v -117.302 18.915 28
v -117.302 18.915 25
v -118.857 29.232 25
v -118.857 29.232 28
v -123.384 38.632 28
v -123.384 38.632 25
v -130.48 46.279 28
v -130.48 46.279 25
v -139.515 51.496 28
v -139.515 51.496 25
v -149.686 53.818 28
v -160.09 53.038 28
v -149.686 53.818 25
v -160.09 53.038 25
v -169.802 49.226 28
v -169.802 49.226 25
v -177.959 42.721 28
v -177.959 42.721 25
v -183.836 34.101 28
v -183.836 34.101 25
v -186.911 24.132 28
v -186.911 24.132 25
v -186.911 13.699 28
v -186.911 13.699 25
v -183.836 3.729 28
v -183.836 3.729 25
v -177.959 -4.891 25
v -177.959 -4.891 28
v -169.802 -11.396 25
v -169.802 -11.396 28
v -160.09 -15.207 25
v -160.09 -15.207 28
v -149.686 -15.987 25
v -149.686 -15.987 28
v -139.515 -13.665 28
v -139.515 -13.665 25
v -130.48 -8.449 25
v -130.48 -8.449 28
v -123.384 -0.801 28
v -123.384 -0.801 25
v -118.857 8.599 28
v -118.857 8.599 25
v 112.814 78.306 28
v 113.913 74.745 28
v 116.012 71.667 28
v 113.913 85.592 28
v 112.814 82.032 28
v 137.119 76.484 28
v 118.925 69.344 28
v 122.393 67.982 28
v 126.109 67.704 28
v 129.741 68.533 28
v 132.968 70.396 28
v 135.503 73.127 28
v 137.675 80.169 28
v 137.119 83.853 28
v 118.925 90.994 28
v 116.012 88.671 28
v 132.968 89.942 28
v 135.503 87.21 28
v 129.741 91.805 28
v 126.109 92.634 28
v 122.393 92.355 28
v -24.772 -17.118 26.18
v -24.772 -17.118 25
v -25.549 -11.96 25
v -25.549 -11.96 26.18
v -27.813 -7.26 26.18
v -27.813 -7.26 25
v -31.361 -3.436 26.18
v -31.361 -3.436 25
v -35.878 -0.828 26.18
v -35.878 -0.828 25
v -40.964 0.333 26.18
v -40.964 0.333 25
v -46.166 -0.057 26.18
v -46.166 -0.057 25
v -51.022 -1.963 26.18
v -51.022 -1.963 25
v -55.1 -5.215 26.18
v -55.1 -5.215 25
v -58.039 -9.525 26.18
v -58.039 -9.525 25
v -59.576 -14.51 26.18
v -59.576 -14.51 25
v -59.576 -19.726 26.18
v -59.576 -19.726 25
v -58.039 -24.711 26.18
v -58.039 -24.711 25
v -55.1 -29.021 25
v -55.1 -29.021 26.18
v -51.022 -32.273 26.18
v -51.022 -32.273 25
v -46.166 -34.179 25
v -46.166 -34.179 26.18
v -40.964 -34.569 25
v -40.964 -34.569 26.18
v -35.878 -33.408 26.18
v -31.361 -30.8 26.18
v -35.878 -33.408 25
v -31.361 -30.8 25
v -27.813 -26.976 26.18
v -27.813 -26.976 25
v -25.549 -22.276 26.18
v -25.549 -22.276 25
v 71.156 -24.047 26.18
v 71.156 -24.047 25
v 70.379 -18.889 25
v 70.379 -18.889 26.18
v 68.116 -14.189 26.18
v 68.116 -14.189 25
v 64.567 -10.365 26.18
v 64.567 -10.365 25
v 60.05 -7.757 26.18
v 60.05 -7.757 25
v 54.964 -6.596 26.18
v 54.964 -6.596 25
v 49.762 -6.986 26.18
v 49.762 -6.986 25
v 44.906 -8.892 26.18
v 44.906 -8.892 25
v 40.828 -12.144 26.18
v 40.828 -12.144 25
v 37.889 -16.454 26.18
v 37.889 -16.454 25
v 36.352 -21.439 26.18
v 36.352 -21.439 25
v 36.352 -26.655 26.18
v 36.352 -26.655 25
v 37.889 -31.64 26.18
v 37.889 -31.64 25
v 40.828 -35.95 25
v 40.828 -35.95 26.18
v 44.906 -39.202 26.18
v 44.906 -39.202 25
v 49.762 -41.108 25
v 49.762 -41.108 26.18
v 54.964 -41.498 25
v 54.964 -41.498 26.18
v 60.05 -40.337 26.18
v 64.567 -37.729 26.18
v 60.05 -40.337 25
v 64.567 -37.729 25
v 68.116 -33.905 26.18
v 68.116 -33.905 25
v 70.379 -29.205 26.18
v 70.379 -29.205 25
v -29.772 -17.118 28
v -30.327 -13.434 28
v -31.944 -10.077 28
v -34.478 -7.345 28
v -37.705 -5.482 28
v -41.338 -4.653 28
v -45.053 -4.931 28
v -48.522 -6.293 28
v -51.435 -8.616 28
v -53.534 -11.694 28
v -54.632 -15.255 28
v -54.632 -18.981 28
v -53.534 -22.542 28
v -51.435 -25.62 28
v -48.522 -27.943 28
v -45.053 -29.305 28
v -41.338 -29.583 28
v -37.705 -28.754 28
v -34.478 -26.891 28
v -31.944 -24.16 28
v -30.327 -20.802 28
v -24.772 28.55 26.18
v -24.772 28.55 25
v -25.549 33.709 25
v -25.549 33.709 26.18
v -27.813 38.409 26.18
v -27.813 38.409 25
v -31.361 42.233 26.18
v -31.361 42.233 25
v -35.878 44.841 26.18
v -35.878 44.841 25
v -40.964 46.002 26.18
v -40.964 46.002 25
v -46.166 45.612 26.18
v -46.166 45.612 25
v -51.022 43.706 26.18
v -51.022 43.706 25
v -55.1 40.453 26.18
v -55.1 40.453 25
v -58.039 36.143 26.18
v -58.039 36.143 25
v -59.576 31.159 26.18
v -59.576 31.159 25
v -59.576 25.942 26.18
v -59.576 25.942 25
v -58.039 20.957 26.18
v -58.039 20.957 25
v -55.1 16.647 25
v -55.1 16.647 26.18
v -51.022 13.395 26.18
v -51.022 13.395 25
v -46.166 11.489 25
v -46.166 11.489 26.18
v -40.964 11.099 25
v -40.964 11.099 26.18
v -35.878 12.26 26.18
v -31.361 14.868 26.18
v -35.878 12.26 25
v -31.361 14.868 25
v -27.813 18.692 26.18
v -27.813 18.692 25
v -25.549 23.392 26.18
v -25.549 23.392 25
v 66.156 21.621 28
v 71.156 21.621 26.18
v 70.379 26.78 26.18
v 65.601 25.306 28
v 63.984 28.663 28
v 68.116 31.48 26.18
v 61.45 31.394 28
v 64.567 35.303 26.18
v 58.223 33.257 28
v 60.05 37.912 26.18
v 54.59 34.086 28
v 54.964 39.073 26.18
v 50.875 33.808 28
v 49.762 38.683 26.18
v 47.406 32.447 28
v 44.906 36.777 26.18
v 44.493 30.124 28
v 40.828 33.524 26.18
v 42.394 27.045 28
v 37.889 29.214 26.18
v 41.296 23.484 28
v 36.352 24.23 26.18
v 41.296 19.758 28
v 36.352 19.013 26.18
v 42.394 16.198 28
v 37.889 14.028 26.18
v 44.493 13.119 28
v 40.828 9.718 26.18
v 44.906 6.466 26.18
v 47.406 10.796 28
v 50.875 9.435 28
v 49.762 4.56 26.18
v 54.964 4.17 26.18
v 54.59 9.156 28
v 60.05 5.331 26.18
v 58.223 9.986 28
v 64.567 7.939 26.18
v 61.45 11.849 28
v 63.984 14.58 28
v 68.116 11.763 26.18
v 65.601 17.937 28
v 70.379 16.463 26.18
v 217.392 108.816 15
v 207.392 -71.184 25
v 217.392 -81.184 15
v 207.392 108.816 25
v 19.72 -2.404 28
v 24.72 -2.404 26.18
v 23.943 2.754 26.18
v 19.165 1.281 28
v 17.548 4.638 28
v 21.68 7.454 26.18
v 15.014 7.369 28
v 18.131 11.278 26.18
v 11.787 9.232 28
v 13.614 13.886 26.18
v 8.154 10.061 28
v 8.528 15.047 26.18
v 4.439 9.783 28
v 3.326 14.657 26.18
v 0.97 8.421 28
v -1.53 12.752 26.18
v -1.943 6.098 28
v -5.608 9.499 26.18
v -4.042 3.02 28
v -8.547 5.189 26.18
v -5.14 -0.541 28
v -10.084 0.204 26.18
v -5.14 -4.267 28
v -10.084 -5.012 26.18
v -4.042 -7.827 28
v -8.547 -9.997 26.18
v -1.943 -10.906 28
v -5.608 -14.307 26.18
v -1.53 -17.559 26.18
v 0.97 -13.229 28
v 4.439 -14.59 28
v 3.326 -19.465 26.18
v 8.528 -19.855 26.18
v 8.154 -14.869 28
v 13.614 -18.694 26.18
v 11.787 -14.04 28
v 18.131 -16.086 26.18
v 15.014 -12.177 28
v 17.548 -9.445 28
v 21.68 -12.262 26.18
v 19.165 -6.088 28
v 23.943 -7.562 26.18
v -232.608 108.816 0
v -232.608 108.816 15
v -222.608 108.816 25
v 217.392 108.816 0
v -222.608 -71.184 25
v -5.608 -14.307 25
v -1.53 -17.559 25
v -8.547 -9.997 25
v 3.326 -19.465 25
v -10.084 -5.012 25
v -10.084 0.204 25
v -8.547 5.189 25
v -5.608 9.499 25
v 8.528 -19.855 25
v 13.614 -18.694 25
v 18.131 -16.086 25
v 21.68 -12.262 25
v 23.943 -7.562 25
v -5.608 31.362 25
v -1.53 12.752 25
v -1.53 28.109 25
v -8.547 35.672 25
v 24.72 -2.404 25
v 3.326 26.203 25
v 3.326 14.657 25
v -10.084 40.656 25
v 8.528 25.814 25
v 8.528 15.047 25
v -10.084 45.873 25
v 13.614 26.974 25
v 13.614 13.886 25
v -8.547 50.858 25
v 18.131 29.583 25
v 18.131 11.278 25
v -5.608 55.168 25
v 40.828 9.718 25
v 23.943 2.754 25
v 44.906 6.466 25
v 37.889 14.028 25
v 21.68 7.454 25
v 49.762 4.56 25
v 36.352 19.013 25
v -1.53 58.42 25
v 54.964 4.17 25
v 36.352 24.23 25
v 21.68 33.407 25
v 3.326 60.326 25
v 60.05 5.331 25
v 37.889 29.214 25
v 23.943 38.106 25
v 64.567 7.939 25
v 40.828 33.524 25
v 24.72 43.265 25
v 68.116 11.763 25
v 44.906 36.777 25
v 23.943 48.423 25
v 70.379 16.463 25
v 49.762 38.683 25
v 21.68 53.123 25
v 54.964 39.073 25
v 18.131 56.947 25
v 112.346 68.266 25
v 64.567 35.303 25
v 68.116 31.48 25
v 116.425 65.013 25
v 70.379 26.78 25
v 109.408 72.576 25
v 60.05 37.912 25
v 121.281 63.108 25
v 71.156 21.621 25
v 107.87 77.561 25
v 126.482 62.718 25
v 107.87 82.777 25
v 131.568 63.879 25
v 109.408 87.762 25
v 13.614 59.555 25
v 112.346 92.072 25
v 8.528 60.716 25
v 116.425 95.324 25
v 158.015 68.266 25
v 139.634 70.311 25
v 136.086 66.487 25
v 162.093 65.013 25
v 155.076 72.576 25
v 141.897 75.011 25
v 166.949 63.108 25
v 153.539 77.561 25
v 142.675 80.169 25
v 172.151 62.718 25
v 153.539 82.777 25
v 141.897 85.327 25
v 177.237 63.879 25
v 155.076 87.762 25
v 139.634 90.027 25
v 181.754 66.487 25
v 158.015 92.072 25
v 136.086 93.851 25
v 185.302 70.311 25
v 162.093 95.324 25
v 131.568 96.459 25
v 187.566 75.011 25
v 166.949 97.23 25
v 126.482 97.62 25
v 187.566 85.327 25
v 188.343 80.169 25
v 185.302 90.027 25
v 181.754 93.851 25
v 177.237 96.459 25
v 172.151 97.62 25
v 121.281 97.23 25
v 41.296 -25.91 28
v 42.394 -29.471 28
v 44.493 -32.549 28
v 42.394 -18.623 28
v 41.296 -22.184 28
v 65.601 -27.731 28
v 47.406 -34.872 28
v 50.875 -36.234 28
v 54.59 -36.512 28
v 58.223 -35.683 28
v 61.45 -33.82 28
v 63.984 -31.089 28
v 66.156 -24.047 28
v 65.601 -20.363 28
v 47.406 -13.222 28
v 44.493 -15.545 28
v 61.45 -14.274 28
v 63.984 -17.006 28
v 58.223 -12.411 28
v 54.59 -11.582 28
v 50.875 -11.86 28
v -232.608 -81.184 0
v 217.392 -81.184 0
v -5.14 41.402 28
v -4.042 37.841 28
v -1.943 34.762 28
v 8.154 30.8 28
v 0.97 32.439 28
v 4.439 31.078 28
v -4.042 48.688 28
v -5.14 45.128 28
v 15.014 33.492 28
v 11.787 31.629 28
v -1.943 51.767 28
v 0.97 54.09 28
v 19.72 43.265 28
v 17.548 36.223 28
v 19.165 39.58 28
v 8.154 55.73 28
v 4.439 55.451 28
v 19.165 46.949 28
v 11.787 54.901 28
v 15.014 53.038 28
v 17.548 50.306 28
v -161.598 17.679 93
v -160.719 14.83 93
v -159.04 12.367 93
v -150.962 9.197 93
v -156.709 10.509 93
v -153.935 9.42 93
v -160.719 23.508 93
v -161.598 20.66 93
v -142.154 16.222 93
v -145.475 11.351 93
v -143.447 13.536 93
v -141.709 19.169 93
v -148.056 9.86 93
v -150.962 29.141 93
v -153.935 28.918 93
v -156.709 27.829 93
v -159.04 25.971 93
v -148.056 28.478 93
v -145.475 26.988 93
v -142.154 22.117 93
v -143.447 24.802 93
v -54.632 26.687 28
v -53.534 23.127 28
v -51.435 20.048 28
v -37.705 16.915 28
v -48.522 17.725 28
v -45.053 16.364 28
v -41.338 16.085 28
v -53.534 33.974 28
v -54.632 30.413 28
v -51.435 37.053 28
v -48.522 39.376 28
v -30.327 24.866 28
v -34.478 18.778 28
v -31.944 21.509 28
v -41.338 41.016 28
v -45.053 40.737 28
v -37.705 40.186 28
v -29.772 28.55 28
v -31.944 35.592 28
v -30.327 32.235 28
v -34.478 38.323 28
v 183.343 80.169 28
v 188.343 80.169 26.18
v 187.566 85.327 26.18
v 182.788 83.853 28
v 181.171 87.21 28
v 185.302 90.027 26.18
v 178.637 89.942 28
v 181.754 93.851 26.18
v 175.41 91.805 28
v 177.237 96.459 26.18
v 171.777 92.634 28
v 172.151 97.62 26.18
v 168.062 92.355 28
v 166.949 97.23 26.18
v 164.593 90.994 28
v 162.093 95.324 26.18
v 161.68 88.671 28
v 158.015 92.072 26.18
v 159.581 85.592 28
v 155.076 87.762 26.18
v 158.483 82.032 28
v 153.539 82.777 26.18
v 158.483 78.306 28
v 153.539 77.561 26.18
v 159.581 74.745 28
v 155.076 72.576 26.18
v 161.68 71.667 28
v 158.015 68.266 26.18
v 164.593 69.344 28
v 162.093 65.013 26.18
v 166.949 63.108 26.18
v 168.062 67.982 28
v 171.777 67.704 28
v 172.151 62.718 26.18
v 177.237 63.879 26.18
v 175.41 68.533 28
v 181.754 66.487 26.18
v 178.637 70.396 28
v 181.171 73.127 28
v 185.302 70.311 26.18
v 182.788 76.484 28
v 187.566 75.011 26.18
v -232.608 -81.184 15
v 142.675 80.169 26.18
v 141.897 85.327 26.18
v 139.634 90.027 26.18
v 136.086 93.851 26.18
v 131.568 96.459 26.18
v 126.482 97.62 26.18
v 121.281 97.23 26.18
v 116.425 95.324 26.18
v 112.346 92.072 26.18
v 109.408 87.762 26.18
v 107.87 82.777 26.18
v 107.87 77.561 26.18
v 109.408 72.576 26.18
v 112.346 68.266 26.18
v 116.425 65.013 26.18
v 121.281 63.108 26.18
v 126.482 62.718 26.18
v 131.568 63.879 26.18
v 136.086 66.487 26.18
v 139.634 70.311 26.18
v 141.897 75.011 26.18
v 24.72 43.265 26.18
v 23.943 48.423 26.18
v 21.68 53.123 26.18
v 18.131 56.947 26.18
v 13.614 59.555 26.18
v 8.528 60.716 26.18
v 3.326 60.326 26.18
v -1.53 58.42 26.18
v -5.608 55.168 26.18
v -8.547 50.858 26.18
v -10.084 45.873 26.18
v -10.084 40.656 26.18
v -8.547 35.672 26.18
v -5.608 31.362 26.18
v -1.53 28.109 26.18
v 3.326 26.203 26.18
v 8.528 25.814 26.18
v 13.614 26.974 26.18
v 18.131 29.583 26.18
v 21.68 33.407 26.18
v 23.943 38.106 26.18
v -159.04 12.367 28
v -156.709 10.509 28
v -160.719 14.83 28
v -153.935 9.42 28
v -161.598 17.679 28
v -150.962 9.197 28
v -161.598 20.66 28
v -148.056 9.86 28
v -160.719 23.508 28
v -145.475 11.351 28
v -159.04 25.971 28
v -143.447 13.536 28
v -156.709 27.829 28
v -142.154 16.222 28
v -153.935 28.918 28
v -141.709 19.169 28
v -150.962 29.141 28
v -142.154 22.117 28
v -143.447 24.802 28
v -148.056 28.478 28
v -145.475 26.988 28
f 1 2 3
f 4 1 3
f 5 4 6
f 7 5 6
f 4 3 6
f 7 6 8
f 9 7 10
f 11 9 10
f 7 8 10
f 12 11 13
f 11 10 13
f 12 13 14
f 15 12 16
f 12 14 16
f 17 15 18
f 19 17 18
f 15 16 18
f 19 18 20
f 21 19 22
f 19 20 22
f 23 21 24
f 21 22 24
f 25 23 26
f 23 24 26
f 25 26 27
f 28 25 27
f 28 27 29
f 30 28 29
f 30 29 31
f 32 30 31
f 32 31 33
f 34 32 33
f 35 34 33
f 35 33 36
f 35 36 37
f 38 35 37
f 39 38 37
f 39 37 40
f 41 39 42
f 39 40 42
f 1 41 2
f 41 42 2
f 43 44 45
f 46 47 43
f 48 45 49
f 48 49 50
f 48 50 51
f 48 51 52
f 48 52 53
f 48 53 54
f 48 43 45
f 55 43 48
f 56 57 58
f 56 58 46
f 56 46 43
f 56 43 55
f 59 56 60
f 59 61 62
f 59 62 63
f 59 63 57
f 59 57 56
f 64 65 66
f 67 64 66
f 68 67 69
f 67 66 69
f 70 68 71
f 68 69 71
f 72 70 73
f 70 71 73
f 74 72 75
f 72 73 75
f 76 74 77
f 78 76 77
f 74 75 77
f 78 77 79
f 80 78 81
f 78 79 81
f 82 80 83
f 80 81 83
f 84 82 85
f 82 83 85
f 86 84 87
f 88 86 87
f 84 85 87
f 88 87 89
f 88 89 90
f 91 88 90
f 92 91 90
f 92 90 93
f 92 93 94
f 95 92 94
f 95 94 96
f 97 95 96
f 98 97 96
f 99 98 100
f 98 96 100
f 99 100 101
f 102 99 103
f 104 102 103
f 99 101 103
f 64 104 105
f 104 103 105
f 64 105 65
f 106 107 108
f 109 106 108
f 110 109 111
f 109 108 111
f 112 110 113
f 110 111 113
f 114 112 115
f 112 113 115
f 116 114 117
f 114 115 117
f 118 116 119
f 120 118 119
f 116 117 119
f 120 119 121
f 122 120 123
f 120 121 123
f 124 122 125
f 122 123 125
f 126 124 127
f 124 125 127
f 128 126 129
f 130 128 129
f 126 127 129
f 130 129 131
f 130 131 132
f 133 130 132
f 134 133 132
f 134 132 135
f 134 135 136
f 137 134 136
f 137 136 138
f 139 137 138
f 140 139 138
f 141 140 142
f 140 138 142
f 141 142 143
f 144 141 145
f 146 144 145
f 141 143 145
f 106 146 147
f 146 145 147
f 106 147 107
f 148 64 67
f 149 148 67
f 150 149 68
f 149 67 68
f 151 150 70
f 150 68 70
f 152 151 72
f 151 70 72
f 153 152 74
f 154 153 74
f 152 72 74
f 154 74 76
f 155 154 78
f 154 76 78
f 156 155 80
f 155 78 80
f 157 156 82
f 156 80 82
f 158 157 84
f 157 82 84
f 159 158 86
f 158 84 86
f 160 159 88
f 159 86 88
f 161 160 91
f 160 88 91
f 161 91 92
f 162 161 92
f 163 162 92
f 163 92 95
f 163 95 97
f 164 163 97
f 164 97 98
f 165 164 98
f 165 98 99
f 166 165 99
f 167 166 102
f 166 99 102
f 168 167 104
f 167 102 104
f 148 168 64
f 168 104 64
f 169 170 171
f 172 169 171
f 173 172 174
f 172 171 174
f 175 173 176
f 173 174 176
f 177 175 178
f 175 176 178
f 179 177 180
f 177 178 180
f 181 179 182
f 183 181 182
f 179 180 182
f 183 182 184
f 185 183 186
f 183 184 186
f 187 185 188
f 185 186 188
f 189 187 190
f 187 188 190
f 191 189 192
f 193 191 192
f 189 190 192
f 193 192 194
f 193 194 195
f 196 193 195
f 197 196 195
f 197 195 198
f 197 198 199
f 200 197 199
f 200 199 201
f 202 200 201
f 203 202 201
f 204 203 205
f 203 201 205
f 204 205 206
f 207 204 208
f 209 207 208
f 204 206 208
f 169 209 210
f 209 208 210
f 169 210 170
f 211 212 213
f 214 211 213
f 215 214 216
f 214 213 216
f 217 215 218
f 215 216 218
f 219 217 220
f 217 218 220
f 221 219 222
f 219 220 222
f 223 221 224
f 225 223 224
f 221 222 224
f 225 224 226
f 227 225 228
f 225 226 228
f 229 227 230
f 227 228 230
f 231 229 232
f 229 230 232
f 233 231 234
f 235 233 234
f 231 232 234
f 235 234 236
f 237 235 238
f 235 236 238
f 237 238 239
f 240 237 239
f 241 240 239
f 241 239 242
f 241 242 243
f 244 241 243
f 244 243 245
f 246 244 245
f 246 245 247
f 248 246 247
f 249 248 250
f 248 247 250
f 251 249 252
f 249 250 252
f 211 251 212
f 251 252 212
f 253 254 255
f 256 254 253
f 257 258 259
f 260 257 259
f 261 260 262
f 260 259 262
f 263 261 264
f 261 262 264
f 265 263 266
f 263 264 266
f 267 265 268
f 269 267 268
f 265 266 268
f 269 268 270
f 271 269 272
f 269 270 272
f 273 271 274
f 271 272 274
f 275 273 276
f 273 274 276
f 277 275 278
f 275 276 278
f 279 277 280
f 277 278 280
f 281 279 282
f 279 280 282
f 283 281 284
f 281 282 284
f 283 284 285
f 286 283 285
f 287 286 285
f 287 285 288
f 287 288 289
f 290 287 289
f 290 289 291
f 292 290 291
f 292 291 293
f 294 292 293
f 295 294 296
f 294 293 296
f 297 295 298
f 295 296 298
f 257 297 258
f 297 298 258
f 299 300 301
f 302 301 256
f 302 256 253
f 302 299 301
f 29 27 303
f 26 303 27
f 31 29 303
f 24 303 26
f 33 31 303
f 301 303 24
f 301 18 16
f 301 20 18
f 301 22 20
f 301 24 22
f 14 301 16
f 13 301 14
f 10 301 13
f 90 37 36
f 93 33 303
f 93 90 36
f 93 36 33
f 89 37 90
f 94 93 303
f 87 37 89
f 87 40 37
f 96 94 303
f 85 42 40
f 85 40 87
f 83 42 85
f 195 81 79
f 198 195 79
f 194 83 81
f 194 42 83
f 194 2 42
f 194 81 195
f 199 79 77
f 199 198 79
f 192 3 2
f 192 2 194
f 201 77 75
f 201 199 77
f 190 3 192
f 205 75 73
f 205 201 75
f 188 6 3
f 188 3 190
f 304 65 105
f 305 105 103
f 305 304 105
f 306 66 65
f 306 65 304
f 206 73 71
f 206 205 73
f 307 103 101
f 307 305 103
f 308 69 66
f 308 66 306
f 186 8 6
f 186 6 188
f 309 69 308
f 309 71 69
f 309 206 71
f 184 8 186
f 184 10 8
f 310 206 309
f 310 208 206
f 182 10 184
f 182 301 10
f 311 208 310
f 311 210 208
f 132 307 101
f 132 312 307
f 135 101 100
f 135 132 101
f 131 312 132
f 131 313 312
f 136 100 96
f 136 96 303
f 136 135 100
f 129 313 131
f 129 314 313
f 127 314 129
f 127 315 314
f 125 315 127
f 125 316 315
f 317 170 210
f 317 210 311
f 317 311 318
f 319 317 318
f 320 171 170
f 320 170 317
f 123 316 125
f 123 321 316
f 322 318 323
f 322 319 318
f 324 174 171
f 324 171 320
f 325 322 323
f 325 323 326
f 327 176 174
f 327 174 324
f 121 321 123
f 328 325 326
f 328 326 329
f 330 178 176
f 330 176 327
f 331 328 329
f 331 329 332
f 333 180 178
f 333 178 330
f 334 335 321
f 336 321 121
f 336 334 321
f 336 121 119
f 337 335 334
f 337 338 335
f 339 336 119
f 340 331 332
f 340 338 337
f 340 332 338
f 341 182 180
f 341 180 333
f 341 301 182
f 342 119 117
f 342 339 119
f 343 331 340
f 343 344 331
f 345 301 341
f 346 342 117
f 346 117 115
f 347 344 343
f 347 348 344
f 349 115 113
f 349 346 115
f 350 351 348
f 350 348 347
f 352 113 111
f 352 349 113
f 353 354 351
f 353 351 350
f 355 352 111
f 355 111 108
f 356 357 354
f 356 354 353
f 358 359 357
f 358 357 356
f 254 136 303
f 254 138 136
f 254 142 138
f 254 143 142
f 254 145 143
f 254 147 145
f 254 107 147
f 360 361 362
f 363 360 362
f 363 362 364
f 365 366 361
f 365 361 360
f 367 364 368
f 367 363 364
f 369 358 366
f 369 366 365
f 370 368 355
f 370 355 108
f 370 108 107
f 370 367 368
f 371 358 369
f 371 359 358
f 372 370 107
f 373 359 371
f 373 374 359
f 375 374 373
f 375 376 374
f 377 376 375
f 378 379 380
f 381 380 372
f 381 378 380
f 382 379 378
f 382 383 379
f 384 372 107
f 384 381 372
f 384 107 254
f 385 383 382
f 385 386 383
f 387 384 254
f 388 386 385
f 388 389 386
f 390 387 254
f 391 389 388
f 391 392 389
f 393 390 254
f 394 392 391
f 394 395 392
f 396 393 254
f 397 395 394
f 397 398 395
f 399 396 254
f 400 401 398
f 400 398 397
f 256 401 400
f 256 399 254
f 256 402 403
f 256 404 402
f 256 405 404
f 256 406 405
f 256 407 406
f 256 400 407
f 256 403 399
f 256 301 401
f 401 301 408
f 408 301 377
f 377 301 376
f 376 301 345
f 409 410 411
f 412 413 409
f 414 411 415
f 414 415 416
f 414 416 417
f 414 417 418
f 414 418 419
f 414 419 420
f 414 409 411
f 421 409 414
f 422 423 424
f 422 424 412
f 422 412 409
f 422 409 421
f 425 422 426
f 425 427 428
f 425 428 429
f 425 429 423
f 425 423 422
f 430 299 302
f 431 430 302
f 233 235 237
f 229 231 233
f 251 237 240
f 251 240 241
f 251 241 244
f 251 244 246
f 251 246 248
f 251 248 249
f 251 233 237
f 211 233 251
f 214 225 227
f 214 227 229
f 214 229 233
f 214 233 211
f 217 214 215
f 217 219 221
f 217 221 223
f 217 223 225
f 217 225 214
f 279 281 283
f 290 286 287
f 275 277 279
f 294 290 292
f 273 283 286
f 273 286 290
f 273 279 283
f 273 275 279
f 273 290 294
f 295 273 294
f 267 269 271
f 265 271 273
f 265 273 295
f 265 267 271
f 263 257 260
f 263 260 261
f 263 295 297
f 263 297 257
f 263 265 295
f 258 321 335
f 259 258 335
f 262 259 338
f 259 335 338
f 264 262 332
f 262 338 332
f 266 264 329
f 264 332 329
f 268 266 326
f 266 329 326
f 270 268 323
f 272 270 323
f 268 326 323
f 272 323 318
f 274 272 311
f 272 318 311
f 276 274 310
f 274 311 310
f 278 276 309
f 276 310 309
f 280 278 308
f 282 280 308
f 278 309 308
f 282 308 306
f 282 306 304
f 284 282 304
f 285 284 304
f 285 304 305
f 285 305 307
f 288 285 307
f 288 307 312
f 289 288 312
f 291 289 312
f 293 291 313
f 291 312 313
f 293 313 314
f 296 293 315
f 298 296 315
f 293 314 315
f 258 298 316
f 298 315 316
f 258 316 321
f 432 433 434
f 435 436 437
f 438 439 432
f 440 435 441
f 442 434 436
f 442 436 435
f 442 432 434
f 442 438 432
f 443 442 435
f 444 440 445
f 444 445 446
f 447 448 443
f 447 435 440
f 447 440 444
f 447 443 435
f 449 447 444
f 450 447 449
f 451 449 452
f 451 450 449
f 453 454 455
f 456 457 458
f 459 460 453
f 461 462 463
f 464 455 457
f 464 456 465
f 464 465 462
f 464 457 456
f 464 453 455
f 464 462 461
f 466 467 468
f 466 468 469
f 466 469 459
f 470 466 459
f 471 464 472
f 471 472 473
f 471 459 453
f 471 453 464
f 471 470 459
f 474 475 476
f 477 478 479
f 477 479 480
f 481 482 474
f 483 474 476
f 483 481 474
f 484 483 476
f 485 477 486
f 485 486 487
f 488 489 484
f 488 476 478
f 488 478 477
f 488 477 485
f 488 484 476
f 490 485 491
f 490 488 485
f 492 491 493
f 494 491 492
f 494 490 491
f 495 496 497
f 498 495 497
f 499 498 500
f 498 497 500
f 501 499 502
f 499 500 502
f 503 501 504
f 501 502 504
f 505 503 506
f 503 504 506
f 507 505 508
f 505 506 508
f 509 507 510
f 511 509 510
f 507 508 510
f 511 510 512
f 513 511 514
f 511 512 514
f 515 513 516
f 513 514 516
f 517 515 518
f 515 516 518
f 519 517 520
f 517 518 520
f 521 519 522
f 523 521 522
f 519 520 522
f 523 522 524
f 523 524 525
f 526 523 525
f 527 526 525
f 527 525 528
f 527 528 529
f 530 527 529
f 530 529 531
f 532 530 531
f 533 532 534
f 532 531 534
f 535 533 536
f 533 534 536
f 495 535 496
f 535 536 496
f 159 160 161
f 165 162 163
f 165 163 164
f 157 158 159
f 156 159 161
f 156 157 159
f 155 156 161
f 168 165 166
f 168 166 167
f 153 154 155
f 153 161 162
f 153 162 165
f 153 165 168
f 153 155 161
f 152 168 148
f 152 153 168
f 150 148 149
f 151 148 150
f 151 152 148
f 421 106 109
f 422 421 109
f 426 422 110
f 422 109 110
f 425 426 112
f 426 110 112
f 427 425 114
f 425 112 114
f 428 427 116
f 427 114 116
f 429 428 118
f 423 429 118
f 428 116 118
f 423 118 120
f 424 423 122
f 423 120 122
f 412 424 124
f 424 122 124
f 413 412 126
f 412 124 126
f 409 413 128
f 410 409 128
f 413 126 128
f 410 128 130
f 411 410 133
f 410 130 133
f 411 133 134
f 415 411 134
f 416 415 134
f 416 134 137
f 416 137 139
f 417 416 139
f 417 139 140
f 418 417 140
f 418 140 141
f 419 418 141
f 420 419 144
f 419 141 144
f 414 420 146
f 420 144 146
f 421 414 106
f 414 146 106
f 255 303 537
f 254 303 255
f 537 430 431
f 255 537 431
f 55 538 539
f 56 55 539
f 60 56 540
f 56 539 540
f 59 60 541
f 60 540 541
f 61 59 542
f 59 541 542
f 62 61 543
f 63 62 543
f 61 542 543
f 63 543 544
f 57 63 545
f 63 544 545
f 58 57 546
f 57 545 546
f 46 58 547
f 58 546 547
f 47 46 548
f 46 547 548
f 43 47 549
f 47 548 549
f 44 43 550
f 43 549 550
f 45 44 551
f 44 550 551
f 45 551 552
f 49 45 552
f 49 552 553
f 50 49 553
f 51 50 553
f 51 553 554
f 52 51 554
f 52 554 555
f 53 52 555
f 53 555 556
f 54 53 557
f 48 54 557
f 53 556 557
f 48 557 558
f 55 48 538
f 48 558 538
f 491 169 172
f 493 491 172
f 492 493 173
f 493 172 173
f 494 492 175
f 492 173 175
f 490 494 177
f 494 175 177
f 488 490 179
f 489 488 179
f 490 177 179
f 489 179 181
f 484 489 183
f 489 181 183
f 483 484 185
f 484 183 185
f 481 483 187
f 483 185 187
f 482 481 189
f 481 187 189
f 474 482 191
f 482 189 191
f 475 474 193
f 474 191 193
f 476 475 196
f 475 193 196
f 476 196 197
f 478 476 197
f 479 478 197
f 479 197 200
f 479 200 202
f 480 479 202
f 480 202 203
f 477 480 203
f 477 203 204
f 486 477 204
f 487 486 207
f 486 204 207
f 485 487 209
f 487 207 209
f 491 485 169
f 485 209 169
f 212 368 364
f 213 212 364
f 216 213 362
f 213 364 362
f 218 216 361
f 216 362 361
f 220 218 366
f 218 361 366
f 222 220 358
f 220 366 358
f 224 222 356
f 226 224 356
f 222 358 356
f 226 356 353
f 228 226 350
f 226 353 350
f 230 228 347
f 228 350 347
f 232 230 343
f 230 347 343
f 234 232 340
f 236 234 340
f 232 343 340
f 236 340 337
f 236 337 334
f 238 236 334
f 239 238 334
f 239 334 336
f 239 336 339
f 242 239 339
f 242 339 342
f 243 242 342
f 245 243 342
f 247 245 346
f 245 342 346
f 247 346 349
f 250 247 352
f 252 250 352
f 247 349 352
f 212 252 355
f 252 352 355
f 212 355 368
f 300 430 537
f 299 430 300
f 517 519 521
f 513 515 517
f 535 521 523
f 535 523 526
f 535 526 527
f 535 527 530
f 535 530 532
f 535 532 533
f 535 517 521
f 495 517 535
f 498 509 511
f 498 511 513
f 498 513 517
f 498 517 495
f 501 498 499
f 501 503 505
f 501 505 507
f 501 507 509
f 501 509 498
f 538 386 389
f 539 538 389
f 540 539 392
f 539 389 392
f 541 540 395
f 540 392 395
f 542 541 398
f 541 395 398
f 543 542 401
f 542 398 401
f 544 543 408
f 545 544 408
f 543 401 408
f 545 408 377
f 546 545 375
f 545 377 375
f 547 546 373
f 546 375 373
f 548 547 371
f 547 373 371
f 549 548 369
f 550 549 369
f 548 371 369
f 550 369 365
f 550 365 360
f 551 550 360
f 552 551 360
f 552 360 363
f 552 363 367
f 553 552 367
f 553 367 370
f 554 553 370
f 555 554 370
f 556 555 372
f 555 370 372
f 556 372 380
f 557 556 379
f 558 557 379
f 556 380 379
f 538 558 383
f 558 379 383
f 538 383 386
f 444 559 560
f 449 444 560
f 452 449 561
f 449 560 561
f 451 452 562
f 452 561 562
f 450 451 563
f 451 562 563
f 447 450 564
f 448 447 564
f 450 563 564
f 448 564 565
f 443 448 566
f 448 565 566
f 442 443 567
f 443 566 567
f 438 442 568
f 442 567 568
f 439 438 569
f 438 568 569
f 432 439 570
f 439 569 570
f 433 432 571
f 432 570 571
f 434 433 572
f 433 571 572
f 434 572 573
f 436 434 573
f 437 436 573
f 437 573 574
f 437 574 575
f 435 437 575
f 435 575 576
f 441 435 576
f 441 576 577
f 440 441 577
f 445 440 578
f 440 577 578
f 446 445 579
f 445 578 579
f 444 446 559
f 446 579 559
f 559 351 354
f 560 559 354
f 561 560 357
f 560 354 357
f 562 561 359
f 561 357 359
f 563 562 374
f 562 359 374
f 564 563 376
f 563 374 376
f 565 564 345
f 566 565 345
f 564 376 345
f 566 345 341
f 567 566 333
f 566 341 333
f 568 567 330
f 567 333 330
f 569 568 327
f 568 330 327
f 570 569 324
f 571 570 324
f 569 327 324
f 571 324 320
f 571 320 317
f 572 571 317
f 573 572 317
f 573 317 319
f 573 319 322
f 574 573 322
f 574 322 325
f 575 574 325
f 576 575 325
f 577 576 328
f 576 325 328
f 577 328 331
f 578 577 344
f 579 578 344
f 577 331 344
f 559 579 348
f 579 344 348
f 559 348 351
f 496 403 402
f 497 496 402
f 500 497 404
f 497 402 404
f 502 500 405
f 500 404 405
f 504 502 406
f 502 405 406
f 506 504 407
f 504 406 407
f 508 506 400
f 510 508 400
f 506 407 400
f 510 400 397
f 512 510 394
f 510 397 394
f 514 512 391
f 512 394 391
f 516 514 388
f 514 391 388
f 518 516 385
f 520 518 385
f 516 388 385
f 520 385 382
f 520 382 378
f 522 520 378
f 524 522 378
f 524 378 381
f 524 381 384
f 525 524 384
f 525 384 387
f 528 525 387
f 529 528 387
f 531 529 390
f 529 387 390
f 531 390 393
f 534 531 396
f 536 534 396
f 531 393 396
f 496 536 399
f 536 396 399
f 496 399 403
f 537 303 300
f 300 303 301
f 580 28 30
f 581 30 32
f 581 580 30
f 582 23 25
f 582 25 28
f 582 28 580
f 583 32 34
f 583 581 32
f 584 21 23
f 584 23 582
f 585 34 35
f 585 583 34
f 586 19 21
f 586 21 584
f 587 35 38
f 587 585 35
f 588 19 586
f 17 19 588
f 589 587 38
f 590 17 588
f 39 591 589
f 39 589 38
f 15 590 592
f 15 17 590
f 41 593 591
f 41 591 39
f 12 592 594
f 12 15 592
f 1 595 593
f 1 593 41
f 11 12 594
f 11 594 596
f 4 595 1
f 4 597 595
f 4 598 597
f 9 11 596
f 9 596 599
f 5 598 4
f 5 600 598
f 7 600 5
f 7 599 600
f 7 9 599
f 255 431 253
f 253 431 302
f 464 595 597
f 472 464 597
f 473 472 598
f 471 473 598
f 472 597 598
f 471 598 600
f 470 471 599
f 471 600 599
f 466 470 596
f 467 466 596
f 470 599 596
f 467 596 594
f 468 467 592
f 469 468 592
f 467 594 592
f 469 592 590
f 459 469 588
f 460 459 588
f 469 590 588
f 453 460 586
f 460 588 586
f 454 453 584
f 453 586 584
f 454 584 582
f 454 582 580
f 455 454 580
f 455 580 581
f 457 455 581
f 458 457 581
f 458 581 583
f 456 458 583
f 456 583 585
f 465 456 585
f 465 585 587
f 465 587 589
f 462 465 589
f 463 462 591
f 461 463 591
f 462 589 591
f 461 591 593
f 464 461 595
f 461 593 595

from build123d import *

# Parameters (mm, degrees)
F0_W       = 450
F0_H       = 190
F1_DEPTH   = 25
F2_SIZE    = 10
F3_R       = 35
F3_R_2     = 17.5
F4_DEPTH   = 3
F5_SIZE2   = 1.8198511713
F5_SIZE    = 5
F5_2_SIZE2 = 1.8198511713
F5_2_SIZE  = 5
F5_3_SIZE2 = 1.8198511713
F5_3_SIZE  = 5
F5_4_SIZE2 = 1.8198511713
F5_4_SIZE  = 5
F5_5_SIZE2 = 1.8198511713
F5_5_SIZE  = 5
F5_6_SIZE2 = 1.8198511713
F5_6_SIZE  = 5
F5_7_SIZE2 = 1.8198511713
F5_7_SIZE  = 5
F5_8_SIZE2 = 1.8198511713
F5_8_SIZE  = 5
F6_R       = 10
F7_DEPTH   = 65


with BuildPart() as f1:
    # F0 (on Top) → F1 (new body)
    with BuildSketch(Plane.XY):
        with Locations((-7.6082125306, 13.8156425953)):
            Rectangle(F0_W, F0_H)
    extrude(amount=F1_DEPTH)

    # F2
    f2_edges = [f1.edges().sort_by_distance(p)[0] for p in [
        (-232.608213, 13.815643, 25),
        (217.391787, 13.815643, 25),
        (-7.608213, -81.184357, 25),
    ]]
    chamfer(f2_edges, length=F2_SIZE)

    # F3 (on face) → F4 (join)
    with BuildSketch(Plane.XY.offset(25)):
        with Locations((-152.3020284353, 18.9153849379)):
            Circle(F3_R)
        with Locations((-42.2719009221, 28.5504534841)):
            Circle(F3_R_2)
        with Locations((-42.2719009221, -17.1180190518)):
            Circle(F3_R_2)
        with Locations((7.2203539312, 43.2646488771)):
            Circle(F3_R_2)
        with Locations((7.2203539312, -2.4038236588)):
            Circle(F3_R_2)
        with Locations((53.6563685164, 21.6214338434)):
            Circle(F3_R_2)
        with Locations((170.8431290463, 80.1688283682)):
            Circle(F3_R_2)
        with Locations((125.1746565104, 80.1688283682)):
            Circle(F3_R_2)
        with Locations((53.6563685164, -24.0470386925)):
            Circle(F3_R_2)
    extrude(amount=F4_DEPTH)

    # F5
    f5_edges = [f1.edges().sort_by_distance(p)[0] for p in [
        (-59.771901, -17.118019, 28),
    ]]
    f5_side = f1.faces().sort_by_distance((-42.271901, -17.118019, 28))[0]
    chamfer(f5_edges, length=F5_SIZE, length2=F5_SIZE2, reference=f5_side)

    # F5#2
    f5_2_edges = [f1.edges().sort_by_distance(p)[0] for p in [
        (36.156369, -24.047039, 28),
    ]]
    f5_2_side = f1.faces().sort_by_distance((53.656369, -24.047039, 28))[0]
    chamfer(f5_2_edges, length=F5_2_SIZE, length2=F5_2_SIZE2, reference=f5_2_side)

    # F5#3
    f5_3_edges = [f1.edges().sort_by_distance(p)[0] for p in [
        (-10.279646, -2.403824, 28),
    ]]
    f5_3_side = f1.faces().sort_by_distance((7.220354, -2.403824, 28))[0]
    chamfer(f5_3_edges, length=F5_3_SIZE, length2=F5_3_SIZE2, reference=f5_3_side)

    # F5#4
    f5_4_edges = [f1.edges().sort_by_distance(p)[0] for p in [
        (36.156369, 21.621434, 28),
    ]]
    f5_4_side = f1.faces().sort_by_distance((53.656369, 21.621434, 28))[0]
    chamfer(f5_4_edges, length=F5_4_SIZE, length2=F5_4_SIZE2, reference=f5_4_side)

    # F5#5
    f5_5_edges = [f1.edges().sort_by_distance(p)[0] for p in [
        (-59.771901, 28.550453, 28),
    ]]
    f5_5_side = f1.faces().sort_by_distance((-42.271901, 28.550453, 28))[0]
    chamfer(f5_5_edges, length=F5_5_SIZE, length2=F5_5_SIZE2, reference=f5_5_side)

    # F5#6
    f5_6_edges = [f1.edges().sort_by_distance(p)[0] for p in [
        (-10.279646, 43.264649, 28),
    ]]
    f5_6_side = f1.faces().sort_by_distance((7.220354, 43.264649, 28))[0]
    chamfer(f5_6_edges, length=F5_6_SIZE, length2=F5_6_SIZE2, reference=f5_6_side)

    # F5#7
    f5_7_edges = [f1.edges().sort_by_distance(p)[0] for p in [
        (107.674657, 80.168828, 28),
    ]]
    f5_7_side = f1.faces().sort_by_distance((125.174657, 80.168828, 28))[0]
    chamfer(f5_7_edges, length=F5_7_SIZE, length2=F5_7_SIZE2, reference=f5_7_side)

    # F5#8
    f5_8_edges = [f1.edges().sort_by_distance(p)[0] for p in [
        (153.343129, 80.168828, 28),
    ]]
    f5_8_side = f1.faces().sort_by_distance((170.843129, 80.168828, 28))[0]
    chamfer(f5_8_edges, length=F5_8_SIZE, length2=F5_8_SIZE2, reference=f5_8_side)

    # F6 (on face) → F7 (join)
    with BuildSketch(Plane.XY.offset(28)):
        with Locations((-151.709437467, 19.1692207788)):
            Circle(F6_R)
    extrude(amount=F7_DEPTH)


solid = f1.part
